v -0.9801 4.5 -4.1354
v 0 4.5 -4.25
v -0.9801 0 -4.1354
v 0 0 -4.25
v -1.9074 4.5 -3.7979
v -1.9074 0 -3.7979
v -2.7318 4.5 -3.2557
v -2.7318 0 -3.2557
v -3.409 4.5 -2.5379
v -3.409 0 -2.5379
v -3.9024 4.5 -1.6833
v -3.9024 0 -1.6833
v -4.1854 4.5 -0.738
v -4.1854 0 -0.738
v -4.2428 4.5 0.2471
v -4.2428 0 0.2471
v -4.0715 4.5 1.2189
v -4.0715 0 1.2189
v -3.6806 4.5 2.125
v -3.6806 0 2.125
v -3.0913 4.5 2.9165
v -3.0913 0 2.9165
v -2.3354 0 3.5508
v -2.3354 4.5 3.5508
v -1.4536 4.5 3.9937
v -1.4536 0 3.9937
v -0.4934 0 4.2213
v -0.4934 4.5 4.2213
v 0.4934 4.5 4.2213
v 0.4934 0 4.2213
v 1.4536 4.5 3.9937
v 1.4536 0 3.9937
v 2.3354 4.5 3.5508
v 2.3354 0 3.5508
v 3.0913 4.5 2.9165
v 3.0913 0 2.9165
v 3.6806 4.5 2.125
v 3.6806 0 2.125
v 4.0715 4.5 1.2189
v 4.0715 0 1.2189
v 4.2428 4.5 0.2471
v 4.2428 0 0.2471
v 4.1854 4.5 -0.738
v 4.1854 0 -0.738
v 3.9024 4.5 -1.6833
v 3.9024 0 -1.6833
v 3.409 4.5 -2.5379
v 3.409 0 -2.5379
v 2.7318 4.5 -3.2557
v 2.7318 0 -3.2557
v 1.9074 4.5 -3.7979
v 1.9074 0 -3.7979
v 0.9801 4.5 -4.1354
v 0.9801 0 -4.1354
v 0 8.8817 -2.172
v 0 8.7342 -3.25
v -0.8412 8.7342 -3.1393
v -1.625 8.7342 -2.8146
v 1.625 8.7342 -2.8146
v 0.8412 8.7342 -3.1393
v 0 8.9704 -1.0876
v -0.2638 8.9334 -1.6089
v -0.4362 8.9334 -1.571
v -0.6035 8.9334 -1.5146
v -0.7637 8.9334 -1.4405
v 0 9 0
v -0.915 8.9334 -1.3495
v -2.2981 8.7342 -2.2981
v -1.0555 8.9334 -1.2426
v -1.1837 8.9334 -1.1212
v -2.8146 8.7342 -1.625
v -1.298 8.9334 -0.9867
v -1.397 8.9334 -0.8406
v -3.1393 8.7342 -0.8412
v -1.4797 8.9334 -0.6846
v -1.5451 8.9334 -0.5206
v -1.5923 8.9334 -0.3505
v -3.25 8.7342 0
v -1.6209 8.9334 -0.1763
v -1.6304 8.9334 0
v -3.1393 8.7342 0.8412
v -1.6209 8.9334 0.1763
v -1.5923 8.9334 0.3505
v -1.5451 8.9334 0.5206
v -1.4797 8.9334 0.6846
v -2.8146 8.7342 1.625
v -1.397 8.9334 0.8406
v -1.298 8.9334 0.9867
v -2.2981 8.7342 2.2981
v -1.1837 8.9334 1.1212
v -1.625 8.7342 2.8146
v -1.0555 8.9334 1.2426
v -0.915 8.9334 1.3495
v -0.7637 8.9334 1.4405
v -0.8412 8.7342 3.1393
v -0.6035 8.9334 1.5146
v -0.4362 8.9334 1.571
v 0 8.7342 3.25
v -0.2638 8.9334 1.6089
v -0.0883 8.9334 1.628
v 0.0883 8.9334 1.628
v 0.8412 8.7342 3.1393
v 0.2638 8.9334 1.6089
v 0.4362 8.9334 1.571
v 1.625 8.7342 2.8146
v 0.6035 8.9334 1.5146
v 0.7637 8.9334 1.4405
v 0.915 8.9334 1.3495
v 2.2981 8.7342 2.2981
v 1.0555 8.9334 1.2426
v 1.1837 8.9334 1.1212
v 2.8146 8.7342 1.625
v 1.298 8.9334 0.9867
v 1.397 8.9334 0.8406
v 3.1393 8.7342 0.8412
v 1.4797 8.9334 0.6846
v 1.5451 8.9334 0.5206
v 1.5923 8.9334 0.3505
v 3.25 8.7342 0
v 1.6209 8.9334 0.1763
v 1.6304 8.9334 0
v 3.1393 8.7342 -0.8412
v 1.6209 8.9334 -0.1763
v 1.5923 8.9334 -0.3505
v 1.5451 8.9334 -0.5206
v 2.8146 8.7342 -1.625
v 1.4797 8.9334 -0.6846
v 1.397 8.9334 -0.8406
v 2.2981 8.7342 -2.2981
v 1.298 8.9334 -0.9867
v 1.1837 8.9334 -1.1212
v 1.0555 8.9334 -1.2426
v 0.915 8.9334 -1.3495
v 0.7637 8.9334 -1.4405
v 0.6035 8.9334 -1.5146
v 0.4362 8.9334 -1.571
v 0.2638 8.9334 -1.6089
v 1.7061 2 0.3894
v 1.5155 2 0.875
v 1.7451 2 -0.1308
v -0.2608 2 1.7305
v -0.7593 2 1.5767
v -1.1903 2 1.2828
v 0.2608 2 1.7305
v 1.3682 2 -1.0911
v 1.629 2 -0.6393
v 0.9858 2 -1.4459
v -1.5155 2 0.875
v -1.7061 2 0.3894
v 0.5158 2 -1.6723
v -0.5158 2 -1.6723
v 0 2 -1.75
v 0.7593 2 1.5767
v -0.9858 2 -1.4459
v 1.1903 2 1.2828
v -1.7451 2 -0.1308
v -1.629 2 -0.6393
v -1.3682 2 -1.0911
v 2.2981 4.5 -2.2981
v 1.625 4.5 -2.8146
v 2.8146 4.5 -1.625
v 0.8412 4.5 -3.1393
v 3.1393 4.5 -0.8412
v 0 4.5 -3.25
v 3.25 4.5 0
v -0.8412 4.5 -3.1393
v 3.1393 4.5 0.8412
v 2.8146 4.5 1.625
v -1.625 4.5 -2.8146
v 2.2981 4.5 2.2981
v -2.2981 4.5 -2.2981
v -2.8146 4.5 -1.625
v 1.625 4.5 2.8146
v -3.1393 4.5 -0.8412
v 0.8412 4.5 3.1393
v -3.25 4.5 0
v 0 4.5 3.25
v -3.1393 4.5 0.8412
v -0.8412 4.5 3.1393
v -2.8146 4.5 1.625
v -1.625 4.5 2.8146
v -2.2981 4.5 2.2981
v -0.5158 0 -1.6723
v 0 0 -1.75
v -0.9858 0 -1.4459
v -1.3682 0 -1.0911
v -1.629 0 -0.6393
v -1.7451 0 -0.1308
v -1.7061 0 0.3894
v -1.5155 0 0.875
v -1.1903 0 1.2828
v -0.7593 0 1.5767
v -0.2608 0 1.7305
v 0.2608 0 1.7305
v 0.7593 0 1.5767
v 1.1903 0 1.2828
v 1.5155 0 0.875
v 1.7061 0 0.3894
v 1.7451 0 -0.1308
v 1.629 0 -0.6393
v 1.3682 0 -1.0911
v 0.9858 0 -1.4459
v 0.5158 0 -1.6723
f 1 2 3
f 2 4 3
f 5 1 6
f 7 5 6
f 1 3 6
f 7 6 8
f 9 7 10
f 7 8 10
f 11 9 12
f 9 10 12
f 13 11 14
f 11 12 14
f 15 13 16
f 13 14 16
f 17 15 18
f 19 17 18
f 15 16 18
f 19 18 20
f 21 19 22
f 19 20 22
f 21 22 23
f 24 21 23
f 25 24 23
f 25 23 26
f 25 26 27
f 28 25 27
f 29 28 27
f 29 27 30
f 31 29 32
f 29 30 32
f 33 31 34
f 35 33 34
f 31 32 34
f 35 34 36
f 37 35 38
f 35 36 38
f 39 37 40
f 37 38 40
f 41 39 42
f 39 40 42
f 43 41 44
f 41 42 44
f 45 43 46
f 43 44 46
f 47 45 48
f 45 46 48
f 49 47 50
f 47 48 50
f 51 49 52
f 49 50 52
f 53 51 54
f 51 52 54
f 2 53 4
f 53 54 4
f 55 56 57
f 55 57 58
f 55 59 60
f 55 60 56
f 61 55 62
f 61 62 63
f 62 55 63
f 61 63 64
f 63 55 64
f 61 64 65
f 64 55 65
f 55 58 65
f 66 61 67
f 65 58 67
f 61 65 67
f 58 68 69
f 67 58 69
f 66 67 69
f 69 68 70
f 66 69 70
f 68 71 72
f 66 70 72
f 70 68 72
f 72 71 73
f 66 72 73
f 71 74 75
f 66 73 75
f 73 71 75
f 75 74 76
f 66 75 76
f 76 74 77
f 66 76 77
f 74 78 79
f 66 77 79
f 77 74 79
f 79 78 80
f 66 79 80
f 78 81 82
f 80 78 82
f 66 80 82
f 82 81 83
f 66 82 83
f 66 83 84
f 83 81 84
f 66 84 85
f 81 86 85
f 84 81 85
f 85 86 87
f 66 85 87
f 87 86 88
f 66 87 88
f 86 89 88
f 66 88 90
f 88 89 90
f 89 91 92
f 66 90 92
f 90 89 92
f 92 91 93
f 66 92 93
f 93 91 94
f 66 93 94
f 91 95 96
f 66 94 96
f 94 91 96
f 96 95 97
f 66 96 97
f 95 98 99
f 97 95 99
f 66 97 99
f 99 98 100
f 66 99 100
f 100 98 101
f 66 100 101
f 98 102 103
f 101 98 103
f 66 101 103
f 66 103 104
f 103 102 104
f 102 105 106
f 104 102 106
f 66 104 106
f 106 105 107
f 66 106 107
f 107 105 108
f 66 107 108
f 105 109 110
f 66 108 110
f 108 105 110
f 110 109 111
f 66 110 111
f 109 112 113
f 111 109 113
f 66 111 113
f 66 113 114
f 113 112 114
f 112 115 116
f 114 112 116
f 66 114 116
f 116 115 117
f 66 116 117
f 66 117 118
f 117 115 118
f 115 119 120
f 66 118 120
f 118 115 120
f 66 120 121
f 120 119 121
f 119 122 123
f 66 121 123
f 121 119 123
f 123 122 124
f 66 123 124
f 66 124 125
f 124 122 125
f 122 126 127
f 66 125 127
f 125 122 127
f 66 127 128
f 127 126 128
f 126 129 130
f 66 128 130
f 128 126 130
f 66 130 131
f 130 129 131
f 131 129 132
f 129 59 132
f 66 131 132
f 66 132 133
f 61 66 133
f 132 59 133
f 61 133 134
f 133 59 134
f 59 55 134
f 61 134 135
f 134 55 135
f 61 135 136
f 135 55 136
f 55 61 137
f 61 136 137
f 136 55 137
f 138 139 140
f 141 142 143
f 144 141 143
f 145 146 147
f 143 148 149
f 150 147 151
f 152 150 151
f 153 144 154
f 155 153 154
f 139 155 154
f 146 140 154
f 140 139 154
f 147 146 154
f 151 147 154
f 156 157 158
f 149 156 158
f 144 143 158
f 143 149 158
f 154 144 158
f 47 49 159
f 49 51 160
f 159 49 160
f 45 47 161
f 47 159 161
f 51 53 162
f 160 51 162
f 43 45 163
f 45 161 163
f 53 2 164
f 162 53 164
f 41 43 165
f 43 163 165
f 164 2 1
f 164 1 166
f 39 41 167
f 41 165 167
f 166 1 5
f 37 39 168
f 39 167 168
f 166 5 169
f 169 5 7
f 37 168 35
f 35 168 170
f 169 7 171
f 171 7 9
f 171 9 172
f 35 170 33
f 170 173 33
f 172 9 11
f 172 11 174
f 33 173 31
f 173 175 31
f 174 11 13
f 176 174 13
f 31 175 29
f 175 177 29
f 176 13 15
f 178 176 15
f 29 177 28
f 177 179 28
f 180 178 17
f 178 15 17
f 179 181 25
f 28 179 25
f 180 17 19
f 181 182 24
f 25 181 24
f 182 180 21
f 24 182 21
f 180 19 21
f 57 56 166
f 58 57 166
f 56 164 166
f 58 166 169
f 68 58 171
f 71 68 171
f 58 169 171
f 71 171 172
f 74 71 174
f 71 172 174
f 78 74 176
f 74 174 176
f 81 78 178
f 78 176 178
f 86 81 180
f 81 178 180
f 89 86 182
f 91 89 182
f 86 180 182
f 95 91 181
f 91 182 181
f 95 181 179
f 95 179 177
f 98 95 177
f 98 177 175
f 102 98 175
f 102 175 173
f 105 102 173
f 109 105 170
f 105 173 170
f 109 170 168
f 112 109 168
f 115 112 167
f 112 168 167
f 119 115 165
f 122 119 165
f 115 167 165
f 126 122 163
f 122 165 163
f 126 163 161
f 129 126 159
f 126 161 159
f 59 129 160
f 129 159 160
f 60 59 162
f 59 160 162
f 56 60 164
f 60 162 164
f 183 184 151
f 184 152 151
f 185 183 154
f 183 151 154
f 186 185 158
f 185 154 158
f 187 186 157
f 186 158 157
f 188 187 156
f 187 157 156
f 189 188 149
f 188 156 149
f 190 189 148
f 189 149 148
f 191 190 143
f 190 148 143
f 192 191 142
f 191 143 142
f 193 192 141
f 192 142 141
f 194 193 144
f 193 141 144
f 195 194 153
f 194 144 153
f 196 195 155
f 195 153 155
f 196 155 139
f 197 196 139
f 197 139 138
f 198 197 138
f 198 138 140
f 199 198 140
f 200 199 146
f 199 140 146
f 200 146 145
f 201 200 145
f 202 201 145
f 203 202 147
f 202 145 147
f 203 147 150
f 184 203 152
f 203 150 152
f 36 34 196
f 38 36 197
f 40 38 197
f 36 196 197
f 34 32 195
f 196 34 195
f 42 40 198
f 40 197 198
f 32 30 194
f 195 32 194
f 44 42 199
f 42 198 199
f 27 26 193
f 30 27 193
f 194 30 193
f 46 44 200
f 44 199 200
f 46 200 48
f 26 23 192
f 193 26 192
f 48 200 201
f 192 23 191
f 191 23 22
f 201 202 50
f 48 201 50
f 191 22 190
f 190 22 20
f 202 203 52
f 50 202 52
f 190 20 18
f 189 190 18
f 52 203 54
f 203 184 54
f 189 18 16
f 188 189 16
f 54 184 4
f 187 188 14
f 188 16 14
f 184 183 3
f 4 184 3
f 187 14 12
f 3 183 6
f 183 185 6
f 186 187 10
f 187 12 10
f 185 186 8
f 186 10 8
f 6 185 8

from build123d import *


with BuildPart() as part:
    # Sketch1 → Revolve1 (revolve)
    with BuildSketch(Plane.XY, mode=Mode.PRIVATE) as revolve1_sk:
        with BuildLine():
            Line((-1.75, 0), (-1.75, 2))
            Line((-1.75, 2), (0, 2))
            Line((0, 2), (0, 9))
            ThreePointArc((0, 9), (-1.630426718, 8.933431935), (-3.25, 8.734170872))
            Line((-3.25, 8.734170872), (-3.25, 4.5))
            Line((-3.25, 4.5), (-4.25, 4.5))
            Line((-4.25, 4.5), (-4.25, 0))
            Line((-4.25, 0), (-1.75, 0))
        make_face()
    revolve(revolve1_sk.sketch.rotate(Axis((0, 2, 0), (0, 1, 0)), 270), axis=Axis((0, 2, 0), (0, 1, 0)))


solid = part.part
